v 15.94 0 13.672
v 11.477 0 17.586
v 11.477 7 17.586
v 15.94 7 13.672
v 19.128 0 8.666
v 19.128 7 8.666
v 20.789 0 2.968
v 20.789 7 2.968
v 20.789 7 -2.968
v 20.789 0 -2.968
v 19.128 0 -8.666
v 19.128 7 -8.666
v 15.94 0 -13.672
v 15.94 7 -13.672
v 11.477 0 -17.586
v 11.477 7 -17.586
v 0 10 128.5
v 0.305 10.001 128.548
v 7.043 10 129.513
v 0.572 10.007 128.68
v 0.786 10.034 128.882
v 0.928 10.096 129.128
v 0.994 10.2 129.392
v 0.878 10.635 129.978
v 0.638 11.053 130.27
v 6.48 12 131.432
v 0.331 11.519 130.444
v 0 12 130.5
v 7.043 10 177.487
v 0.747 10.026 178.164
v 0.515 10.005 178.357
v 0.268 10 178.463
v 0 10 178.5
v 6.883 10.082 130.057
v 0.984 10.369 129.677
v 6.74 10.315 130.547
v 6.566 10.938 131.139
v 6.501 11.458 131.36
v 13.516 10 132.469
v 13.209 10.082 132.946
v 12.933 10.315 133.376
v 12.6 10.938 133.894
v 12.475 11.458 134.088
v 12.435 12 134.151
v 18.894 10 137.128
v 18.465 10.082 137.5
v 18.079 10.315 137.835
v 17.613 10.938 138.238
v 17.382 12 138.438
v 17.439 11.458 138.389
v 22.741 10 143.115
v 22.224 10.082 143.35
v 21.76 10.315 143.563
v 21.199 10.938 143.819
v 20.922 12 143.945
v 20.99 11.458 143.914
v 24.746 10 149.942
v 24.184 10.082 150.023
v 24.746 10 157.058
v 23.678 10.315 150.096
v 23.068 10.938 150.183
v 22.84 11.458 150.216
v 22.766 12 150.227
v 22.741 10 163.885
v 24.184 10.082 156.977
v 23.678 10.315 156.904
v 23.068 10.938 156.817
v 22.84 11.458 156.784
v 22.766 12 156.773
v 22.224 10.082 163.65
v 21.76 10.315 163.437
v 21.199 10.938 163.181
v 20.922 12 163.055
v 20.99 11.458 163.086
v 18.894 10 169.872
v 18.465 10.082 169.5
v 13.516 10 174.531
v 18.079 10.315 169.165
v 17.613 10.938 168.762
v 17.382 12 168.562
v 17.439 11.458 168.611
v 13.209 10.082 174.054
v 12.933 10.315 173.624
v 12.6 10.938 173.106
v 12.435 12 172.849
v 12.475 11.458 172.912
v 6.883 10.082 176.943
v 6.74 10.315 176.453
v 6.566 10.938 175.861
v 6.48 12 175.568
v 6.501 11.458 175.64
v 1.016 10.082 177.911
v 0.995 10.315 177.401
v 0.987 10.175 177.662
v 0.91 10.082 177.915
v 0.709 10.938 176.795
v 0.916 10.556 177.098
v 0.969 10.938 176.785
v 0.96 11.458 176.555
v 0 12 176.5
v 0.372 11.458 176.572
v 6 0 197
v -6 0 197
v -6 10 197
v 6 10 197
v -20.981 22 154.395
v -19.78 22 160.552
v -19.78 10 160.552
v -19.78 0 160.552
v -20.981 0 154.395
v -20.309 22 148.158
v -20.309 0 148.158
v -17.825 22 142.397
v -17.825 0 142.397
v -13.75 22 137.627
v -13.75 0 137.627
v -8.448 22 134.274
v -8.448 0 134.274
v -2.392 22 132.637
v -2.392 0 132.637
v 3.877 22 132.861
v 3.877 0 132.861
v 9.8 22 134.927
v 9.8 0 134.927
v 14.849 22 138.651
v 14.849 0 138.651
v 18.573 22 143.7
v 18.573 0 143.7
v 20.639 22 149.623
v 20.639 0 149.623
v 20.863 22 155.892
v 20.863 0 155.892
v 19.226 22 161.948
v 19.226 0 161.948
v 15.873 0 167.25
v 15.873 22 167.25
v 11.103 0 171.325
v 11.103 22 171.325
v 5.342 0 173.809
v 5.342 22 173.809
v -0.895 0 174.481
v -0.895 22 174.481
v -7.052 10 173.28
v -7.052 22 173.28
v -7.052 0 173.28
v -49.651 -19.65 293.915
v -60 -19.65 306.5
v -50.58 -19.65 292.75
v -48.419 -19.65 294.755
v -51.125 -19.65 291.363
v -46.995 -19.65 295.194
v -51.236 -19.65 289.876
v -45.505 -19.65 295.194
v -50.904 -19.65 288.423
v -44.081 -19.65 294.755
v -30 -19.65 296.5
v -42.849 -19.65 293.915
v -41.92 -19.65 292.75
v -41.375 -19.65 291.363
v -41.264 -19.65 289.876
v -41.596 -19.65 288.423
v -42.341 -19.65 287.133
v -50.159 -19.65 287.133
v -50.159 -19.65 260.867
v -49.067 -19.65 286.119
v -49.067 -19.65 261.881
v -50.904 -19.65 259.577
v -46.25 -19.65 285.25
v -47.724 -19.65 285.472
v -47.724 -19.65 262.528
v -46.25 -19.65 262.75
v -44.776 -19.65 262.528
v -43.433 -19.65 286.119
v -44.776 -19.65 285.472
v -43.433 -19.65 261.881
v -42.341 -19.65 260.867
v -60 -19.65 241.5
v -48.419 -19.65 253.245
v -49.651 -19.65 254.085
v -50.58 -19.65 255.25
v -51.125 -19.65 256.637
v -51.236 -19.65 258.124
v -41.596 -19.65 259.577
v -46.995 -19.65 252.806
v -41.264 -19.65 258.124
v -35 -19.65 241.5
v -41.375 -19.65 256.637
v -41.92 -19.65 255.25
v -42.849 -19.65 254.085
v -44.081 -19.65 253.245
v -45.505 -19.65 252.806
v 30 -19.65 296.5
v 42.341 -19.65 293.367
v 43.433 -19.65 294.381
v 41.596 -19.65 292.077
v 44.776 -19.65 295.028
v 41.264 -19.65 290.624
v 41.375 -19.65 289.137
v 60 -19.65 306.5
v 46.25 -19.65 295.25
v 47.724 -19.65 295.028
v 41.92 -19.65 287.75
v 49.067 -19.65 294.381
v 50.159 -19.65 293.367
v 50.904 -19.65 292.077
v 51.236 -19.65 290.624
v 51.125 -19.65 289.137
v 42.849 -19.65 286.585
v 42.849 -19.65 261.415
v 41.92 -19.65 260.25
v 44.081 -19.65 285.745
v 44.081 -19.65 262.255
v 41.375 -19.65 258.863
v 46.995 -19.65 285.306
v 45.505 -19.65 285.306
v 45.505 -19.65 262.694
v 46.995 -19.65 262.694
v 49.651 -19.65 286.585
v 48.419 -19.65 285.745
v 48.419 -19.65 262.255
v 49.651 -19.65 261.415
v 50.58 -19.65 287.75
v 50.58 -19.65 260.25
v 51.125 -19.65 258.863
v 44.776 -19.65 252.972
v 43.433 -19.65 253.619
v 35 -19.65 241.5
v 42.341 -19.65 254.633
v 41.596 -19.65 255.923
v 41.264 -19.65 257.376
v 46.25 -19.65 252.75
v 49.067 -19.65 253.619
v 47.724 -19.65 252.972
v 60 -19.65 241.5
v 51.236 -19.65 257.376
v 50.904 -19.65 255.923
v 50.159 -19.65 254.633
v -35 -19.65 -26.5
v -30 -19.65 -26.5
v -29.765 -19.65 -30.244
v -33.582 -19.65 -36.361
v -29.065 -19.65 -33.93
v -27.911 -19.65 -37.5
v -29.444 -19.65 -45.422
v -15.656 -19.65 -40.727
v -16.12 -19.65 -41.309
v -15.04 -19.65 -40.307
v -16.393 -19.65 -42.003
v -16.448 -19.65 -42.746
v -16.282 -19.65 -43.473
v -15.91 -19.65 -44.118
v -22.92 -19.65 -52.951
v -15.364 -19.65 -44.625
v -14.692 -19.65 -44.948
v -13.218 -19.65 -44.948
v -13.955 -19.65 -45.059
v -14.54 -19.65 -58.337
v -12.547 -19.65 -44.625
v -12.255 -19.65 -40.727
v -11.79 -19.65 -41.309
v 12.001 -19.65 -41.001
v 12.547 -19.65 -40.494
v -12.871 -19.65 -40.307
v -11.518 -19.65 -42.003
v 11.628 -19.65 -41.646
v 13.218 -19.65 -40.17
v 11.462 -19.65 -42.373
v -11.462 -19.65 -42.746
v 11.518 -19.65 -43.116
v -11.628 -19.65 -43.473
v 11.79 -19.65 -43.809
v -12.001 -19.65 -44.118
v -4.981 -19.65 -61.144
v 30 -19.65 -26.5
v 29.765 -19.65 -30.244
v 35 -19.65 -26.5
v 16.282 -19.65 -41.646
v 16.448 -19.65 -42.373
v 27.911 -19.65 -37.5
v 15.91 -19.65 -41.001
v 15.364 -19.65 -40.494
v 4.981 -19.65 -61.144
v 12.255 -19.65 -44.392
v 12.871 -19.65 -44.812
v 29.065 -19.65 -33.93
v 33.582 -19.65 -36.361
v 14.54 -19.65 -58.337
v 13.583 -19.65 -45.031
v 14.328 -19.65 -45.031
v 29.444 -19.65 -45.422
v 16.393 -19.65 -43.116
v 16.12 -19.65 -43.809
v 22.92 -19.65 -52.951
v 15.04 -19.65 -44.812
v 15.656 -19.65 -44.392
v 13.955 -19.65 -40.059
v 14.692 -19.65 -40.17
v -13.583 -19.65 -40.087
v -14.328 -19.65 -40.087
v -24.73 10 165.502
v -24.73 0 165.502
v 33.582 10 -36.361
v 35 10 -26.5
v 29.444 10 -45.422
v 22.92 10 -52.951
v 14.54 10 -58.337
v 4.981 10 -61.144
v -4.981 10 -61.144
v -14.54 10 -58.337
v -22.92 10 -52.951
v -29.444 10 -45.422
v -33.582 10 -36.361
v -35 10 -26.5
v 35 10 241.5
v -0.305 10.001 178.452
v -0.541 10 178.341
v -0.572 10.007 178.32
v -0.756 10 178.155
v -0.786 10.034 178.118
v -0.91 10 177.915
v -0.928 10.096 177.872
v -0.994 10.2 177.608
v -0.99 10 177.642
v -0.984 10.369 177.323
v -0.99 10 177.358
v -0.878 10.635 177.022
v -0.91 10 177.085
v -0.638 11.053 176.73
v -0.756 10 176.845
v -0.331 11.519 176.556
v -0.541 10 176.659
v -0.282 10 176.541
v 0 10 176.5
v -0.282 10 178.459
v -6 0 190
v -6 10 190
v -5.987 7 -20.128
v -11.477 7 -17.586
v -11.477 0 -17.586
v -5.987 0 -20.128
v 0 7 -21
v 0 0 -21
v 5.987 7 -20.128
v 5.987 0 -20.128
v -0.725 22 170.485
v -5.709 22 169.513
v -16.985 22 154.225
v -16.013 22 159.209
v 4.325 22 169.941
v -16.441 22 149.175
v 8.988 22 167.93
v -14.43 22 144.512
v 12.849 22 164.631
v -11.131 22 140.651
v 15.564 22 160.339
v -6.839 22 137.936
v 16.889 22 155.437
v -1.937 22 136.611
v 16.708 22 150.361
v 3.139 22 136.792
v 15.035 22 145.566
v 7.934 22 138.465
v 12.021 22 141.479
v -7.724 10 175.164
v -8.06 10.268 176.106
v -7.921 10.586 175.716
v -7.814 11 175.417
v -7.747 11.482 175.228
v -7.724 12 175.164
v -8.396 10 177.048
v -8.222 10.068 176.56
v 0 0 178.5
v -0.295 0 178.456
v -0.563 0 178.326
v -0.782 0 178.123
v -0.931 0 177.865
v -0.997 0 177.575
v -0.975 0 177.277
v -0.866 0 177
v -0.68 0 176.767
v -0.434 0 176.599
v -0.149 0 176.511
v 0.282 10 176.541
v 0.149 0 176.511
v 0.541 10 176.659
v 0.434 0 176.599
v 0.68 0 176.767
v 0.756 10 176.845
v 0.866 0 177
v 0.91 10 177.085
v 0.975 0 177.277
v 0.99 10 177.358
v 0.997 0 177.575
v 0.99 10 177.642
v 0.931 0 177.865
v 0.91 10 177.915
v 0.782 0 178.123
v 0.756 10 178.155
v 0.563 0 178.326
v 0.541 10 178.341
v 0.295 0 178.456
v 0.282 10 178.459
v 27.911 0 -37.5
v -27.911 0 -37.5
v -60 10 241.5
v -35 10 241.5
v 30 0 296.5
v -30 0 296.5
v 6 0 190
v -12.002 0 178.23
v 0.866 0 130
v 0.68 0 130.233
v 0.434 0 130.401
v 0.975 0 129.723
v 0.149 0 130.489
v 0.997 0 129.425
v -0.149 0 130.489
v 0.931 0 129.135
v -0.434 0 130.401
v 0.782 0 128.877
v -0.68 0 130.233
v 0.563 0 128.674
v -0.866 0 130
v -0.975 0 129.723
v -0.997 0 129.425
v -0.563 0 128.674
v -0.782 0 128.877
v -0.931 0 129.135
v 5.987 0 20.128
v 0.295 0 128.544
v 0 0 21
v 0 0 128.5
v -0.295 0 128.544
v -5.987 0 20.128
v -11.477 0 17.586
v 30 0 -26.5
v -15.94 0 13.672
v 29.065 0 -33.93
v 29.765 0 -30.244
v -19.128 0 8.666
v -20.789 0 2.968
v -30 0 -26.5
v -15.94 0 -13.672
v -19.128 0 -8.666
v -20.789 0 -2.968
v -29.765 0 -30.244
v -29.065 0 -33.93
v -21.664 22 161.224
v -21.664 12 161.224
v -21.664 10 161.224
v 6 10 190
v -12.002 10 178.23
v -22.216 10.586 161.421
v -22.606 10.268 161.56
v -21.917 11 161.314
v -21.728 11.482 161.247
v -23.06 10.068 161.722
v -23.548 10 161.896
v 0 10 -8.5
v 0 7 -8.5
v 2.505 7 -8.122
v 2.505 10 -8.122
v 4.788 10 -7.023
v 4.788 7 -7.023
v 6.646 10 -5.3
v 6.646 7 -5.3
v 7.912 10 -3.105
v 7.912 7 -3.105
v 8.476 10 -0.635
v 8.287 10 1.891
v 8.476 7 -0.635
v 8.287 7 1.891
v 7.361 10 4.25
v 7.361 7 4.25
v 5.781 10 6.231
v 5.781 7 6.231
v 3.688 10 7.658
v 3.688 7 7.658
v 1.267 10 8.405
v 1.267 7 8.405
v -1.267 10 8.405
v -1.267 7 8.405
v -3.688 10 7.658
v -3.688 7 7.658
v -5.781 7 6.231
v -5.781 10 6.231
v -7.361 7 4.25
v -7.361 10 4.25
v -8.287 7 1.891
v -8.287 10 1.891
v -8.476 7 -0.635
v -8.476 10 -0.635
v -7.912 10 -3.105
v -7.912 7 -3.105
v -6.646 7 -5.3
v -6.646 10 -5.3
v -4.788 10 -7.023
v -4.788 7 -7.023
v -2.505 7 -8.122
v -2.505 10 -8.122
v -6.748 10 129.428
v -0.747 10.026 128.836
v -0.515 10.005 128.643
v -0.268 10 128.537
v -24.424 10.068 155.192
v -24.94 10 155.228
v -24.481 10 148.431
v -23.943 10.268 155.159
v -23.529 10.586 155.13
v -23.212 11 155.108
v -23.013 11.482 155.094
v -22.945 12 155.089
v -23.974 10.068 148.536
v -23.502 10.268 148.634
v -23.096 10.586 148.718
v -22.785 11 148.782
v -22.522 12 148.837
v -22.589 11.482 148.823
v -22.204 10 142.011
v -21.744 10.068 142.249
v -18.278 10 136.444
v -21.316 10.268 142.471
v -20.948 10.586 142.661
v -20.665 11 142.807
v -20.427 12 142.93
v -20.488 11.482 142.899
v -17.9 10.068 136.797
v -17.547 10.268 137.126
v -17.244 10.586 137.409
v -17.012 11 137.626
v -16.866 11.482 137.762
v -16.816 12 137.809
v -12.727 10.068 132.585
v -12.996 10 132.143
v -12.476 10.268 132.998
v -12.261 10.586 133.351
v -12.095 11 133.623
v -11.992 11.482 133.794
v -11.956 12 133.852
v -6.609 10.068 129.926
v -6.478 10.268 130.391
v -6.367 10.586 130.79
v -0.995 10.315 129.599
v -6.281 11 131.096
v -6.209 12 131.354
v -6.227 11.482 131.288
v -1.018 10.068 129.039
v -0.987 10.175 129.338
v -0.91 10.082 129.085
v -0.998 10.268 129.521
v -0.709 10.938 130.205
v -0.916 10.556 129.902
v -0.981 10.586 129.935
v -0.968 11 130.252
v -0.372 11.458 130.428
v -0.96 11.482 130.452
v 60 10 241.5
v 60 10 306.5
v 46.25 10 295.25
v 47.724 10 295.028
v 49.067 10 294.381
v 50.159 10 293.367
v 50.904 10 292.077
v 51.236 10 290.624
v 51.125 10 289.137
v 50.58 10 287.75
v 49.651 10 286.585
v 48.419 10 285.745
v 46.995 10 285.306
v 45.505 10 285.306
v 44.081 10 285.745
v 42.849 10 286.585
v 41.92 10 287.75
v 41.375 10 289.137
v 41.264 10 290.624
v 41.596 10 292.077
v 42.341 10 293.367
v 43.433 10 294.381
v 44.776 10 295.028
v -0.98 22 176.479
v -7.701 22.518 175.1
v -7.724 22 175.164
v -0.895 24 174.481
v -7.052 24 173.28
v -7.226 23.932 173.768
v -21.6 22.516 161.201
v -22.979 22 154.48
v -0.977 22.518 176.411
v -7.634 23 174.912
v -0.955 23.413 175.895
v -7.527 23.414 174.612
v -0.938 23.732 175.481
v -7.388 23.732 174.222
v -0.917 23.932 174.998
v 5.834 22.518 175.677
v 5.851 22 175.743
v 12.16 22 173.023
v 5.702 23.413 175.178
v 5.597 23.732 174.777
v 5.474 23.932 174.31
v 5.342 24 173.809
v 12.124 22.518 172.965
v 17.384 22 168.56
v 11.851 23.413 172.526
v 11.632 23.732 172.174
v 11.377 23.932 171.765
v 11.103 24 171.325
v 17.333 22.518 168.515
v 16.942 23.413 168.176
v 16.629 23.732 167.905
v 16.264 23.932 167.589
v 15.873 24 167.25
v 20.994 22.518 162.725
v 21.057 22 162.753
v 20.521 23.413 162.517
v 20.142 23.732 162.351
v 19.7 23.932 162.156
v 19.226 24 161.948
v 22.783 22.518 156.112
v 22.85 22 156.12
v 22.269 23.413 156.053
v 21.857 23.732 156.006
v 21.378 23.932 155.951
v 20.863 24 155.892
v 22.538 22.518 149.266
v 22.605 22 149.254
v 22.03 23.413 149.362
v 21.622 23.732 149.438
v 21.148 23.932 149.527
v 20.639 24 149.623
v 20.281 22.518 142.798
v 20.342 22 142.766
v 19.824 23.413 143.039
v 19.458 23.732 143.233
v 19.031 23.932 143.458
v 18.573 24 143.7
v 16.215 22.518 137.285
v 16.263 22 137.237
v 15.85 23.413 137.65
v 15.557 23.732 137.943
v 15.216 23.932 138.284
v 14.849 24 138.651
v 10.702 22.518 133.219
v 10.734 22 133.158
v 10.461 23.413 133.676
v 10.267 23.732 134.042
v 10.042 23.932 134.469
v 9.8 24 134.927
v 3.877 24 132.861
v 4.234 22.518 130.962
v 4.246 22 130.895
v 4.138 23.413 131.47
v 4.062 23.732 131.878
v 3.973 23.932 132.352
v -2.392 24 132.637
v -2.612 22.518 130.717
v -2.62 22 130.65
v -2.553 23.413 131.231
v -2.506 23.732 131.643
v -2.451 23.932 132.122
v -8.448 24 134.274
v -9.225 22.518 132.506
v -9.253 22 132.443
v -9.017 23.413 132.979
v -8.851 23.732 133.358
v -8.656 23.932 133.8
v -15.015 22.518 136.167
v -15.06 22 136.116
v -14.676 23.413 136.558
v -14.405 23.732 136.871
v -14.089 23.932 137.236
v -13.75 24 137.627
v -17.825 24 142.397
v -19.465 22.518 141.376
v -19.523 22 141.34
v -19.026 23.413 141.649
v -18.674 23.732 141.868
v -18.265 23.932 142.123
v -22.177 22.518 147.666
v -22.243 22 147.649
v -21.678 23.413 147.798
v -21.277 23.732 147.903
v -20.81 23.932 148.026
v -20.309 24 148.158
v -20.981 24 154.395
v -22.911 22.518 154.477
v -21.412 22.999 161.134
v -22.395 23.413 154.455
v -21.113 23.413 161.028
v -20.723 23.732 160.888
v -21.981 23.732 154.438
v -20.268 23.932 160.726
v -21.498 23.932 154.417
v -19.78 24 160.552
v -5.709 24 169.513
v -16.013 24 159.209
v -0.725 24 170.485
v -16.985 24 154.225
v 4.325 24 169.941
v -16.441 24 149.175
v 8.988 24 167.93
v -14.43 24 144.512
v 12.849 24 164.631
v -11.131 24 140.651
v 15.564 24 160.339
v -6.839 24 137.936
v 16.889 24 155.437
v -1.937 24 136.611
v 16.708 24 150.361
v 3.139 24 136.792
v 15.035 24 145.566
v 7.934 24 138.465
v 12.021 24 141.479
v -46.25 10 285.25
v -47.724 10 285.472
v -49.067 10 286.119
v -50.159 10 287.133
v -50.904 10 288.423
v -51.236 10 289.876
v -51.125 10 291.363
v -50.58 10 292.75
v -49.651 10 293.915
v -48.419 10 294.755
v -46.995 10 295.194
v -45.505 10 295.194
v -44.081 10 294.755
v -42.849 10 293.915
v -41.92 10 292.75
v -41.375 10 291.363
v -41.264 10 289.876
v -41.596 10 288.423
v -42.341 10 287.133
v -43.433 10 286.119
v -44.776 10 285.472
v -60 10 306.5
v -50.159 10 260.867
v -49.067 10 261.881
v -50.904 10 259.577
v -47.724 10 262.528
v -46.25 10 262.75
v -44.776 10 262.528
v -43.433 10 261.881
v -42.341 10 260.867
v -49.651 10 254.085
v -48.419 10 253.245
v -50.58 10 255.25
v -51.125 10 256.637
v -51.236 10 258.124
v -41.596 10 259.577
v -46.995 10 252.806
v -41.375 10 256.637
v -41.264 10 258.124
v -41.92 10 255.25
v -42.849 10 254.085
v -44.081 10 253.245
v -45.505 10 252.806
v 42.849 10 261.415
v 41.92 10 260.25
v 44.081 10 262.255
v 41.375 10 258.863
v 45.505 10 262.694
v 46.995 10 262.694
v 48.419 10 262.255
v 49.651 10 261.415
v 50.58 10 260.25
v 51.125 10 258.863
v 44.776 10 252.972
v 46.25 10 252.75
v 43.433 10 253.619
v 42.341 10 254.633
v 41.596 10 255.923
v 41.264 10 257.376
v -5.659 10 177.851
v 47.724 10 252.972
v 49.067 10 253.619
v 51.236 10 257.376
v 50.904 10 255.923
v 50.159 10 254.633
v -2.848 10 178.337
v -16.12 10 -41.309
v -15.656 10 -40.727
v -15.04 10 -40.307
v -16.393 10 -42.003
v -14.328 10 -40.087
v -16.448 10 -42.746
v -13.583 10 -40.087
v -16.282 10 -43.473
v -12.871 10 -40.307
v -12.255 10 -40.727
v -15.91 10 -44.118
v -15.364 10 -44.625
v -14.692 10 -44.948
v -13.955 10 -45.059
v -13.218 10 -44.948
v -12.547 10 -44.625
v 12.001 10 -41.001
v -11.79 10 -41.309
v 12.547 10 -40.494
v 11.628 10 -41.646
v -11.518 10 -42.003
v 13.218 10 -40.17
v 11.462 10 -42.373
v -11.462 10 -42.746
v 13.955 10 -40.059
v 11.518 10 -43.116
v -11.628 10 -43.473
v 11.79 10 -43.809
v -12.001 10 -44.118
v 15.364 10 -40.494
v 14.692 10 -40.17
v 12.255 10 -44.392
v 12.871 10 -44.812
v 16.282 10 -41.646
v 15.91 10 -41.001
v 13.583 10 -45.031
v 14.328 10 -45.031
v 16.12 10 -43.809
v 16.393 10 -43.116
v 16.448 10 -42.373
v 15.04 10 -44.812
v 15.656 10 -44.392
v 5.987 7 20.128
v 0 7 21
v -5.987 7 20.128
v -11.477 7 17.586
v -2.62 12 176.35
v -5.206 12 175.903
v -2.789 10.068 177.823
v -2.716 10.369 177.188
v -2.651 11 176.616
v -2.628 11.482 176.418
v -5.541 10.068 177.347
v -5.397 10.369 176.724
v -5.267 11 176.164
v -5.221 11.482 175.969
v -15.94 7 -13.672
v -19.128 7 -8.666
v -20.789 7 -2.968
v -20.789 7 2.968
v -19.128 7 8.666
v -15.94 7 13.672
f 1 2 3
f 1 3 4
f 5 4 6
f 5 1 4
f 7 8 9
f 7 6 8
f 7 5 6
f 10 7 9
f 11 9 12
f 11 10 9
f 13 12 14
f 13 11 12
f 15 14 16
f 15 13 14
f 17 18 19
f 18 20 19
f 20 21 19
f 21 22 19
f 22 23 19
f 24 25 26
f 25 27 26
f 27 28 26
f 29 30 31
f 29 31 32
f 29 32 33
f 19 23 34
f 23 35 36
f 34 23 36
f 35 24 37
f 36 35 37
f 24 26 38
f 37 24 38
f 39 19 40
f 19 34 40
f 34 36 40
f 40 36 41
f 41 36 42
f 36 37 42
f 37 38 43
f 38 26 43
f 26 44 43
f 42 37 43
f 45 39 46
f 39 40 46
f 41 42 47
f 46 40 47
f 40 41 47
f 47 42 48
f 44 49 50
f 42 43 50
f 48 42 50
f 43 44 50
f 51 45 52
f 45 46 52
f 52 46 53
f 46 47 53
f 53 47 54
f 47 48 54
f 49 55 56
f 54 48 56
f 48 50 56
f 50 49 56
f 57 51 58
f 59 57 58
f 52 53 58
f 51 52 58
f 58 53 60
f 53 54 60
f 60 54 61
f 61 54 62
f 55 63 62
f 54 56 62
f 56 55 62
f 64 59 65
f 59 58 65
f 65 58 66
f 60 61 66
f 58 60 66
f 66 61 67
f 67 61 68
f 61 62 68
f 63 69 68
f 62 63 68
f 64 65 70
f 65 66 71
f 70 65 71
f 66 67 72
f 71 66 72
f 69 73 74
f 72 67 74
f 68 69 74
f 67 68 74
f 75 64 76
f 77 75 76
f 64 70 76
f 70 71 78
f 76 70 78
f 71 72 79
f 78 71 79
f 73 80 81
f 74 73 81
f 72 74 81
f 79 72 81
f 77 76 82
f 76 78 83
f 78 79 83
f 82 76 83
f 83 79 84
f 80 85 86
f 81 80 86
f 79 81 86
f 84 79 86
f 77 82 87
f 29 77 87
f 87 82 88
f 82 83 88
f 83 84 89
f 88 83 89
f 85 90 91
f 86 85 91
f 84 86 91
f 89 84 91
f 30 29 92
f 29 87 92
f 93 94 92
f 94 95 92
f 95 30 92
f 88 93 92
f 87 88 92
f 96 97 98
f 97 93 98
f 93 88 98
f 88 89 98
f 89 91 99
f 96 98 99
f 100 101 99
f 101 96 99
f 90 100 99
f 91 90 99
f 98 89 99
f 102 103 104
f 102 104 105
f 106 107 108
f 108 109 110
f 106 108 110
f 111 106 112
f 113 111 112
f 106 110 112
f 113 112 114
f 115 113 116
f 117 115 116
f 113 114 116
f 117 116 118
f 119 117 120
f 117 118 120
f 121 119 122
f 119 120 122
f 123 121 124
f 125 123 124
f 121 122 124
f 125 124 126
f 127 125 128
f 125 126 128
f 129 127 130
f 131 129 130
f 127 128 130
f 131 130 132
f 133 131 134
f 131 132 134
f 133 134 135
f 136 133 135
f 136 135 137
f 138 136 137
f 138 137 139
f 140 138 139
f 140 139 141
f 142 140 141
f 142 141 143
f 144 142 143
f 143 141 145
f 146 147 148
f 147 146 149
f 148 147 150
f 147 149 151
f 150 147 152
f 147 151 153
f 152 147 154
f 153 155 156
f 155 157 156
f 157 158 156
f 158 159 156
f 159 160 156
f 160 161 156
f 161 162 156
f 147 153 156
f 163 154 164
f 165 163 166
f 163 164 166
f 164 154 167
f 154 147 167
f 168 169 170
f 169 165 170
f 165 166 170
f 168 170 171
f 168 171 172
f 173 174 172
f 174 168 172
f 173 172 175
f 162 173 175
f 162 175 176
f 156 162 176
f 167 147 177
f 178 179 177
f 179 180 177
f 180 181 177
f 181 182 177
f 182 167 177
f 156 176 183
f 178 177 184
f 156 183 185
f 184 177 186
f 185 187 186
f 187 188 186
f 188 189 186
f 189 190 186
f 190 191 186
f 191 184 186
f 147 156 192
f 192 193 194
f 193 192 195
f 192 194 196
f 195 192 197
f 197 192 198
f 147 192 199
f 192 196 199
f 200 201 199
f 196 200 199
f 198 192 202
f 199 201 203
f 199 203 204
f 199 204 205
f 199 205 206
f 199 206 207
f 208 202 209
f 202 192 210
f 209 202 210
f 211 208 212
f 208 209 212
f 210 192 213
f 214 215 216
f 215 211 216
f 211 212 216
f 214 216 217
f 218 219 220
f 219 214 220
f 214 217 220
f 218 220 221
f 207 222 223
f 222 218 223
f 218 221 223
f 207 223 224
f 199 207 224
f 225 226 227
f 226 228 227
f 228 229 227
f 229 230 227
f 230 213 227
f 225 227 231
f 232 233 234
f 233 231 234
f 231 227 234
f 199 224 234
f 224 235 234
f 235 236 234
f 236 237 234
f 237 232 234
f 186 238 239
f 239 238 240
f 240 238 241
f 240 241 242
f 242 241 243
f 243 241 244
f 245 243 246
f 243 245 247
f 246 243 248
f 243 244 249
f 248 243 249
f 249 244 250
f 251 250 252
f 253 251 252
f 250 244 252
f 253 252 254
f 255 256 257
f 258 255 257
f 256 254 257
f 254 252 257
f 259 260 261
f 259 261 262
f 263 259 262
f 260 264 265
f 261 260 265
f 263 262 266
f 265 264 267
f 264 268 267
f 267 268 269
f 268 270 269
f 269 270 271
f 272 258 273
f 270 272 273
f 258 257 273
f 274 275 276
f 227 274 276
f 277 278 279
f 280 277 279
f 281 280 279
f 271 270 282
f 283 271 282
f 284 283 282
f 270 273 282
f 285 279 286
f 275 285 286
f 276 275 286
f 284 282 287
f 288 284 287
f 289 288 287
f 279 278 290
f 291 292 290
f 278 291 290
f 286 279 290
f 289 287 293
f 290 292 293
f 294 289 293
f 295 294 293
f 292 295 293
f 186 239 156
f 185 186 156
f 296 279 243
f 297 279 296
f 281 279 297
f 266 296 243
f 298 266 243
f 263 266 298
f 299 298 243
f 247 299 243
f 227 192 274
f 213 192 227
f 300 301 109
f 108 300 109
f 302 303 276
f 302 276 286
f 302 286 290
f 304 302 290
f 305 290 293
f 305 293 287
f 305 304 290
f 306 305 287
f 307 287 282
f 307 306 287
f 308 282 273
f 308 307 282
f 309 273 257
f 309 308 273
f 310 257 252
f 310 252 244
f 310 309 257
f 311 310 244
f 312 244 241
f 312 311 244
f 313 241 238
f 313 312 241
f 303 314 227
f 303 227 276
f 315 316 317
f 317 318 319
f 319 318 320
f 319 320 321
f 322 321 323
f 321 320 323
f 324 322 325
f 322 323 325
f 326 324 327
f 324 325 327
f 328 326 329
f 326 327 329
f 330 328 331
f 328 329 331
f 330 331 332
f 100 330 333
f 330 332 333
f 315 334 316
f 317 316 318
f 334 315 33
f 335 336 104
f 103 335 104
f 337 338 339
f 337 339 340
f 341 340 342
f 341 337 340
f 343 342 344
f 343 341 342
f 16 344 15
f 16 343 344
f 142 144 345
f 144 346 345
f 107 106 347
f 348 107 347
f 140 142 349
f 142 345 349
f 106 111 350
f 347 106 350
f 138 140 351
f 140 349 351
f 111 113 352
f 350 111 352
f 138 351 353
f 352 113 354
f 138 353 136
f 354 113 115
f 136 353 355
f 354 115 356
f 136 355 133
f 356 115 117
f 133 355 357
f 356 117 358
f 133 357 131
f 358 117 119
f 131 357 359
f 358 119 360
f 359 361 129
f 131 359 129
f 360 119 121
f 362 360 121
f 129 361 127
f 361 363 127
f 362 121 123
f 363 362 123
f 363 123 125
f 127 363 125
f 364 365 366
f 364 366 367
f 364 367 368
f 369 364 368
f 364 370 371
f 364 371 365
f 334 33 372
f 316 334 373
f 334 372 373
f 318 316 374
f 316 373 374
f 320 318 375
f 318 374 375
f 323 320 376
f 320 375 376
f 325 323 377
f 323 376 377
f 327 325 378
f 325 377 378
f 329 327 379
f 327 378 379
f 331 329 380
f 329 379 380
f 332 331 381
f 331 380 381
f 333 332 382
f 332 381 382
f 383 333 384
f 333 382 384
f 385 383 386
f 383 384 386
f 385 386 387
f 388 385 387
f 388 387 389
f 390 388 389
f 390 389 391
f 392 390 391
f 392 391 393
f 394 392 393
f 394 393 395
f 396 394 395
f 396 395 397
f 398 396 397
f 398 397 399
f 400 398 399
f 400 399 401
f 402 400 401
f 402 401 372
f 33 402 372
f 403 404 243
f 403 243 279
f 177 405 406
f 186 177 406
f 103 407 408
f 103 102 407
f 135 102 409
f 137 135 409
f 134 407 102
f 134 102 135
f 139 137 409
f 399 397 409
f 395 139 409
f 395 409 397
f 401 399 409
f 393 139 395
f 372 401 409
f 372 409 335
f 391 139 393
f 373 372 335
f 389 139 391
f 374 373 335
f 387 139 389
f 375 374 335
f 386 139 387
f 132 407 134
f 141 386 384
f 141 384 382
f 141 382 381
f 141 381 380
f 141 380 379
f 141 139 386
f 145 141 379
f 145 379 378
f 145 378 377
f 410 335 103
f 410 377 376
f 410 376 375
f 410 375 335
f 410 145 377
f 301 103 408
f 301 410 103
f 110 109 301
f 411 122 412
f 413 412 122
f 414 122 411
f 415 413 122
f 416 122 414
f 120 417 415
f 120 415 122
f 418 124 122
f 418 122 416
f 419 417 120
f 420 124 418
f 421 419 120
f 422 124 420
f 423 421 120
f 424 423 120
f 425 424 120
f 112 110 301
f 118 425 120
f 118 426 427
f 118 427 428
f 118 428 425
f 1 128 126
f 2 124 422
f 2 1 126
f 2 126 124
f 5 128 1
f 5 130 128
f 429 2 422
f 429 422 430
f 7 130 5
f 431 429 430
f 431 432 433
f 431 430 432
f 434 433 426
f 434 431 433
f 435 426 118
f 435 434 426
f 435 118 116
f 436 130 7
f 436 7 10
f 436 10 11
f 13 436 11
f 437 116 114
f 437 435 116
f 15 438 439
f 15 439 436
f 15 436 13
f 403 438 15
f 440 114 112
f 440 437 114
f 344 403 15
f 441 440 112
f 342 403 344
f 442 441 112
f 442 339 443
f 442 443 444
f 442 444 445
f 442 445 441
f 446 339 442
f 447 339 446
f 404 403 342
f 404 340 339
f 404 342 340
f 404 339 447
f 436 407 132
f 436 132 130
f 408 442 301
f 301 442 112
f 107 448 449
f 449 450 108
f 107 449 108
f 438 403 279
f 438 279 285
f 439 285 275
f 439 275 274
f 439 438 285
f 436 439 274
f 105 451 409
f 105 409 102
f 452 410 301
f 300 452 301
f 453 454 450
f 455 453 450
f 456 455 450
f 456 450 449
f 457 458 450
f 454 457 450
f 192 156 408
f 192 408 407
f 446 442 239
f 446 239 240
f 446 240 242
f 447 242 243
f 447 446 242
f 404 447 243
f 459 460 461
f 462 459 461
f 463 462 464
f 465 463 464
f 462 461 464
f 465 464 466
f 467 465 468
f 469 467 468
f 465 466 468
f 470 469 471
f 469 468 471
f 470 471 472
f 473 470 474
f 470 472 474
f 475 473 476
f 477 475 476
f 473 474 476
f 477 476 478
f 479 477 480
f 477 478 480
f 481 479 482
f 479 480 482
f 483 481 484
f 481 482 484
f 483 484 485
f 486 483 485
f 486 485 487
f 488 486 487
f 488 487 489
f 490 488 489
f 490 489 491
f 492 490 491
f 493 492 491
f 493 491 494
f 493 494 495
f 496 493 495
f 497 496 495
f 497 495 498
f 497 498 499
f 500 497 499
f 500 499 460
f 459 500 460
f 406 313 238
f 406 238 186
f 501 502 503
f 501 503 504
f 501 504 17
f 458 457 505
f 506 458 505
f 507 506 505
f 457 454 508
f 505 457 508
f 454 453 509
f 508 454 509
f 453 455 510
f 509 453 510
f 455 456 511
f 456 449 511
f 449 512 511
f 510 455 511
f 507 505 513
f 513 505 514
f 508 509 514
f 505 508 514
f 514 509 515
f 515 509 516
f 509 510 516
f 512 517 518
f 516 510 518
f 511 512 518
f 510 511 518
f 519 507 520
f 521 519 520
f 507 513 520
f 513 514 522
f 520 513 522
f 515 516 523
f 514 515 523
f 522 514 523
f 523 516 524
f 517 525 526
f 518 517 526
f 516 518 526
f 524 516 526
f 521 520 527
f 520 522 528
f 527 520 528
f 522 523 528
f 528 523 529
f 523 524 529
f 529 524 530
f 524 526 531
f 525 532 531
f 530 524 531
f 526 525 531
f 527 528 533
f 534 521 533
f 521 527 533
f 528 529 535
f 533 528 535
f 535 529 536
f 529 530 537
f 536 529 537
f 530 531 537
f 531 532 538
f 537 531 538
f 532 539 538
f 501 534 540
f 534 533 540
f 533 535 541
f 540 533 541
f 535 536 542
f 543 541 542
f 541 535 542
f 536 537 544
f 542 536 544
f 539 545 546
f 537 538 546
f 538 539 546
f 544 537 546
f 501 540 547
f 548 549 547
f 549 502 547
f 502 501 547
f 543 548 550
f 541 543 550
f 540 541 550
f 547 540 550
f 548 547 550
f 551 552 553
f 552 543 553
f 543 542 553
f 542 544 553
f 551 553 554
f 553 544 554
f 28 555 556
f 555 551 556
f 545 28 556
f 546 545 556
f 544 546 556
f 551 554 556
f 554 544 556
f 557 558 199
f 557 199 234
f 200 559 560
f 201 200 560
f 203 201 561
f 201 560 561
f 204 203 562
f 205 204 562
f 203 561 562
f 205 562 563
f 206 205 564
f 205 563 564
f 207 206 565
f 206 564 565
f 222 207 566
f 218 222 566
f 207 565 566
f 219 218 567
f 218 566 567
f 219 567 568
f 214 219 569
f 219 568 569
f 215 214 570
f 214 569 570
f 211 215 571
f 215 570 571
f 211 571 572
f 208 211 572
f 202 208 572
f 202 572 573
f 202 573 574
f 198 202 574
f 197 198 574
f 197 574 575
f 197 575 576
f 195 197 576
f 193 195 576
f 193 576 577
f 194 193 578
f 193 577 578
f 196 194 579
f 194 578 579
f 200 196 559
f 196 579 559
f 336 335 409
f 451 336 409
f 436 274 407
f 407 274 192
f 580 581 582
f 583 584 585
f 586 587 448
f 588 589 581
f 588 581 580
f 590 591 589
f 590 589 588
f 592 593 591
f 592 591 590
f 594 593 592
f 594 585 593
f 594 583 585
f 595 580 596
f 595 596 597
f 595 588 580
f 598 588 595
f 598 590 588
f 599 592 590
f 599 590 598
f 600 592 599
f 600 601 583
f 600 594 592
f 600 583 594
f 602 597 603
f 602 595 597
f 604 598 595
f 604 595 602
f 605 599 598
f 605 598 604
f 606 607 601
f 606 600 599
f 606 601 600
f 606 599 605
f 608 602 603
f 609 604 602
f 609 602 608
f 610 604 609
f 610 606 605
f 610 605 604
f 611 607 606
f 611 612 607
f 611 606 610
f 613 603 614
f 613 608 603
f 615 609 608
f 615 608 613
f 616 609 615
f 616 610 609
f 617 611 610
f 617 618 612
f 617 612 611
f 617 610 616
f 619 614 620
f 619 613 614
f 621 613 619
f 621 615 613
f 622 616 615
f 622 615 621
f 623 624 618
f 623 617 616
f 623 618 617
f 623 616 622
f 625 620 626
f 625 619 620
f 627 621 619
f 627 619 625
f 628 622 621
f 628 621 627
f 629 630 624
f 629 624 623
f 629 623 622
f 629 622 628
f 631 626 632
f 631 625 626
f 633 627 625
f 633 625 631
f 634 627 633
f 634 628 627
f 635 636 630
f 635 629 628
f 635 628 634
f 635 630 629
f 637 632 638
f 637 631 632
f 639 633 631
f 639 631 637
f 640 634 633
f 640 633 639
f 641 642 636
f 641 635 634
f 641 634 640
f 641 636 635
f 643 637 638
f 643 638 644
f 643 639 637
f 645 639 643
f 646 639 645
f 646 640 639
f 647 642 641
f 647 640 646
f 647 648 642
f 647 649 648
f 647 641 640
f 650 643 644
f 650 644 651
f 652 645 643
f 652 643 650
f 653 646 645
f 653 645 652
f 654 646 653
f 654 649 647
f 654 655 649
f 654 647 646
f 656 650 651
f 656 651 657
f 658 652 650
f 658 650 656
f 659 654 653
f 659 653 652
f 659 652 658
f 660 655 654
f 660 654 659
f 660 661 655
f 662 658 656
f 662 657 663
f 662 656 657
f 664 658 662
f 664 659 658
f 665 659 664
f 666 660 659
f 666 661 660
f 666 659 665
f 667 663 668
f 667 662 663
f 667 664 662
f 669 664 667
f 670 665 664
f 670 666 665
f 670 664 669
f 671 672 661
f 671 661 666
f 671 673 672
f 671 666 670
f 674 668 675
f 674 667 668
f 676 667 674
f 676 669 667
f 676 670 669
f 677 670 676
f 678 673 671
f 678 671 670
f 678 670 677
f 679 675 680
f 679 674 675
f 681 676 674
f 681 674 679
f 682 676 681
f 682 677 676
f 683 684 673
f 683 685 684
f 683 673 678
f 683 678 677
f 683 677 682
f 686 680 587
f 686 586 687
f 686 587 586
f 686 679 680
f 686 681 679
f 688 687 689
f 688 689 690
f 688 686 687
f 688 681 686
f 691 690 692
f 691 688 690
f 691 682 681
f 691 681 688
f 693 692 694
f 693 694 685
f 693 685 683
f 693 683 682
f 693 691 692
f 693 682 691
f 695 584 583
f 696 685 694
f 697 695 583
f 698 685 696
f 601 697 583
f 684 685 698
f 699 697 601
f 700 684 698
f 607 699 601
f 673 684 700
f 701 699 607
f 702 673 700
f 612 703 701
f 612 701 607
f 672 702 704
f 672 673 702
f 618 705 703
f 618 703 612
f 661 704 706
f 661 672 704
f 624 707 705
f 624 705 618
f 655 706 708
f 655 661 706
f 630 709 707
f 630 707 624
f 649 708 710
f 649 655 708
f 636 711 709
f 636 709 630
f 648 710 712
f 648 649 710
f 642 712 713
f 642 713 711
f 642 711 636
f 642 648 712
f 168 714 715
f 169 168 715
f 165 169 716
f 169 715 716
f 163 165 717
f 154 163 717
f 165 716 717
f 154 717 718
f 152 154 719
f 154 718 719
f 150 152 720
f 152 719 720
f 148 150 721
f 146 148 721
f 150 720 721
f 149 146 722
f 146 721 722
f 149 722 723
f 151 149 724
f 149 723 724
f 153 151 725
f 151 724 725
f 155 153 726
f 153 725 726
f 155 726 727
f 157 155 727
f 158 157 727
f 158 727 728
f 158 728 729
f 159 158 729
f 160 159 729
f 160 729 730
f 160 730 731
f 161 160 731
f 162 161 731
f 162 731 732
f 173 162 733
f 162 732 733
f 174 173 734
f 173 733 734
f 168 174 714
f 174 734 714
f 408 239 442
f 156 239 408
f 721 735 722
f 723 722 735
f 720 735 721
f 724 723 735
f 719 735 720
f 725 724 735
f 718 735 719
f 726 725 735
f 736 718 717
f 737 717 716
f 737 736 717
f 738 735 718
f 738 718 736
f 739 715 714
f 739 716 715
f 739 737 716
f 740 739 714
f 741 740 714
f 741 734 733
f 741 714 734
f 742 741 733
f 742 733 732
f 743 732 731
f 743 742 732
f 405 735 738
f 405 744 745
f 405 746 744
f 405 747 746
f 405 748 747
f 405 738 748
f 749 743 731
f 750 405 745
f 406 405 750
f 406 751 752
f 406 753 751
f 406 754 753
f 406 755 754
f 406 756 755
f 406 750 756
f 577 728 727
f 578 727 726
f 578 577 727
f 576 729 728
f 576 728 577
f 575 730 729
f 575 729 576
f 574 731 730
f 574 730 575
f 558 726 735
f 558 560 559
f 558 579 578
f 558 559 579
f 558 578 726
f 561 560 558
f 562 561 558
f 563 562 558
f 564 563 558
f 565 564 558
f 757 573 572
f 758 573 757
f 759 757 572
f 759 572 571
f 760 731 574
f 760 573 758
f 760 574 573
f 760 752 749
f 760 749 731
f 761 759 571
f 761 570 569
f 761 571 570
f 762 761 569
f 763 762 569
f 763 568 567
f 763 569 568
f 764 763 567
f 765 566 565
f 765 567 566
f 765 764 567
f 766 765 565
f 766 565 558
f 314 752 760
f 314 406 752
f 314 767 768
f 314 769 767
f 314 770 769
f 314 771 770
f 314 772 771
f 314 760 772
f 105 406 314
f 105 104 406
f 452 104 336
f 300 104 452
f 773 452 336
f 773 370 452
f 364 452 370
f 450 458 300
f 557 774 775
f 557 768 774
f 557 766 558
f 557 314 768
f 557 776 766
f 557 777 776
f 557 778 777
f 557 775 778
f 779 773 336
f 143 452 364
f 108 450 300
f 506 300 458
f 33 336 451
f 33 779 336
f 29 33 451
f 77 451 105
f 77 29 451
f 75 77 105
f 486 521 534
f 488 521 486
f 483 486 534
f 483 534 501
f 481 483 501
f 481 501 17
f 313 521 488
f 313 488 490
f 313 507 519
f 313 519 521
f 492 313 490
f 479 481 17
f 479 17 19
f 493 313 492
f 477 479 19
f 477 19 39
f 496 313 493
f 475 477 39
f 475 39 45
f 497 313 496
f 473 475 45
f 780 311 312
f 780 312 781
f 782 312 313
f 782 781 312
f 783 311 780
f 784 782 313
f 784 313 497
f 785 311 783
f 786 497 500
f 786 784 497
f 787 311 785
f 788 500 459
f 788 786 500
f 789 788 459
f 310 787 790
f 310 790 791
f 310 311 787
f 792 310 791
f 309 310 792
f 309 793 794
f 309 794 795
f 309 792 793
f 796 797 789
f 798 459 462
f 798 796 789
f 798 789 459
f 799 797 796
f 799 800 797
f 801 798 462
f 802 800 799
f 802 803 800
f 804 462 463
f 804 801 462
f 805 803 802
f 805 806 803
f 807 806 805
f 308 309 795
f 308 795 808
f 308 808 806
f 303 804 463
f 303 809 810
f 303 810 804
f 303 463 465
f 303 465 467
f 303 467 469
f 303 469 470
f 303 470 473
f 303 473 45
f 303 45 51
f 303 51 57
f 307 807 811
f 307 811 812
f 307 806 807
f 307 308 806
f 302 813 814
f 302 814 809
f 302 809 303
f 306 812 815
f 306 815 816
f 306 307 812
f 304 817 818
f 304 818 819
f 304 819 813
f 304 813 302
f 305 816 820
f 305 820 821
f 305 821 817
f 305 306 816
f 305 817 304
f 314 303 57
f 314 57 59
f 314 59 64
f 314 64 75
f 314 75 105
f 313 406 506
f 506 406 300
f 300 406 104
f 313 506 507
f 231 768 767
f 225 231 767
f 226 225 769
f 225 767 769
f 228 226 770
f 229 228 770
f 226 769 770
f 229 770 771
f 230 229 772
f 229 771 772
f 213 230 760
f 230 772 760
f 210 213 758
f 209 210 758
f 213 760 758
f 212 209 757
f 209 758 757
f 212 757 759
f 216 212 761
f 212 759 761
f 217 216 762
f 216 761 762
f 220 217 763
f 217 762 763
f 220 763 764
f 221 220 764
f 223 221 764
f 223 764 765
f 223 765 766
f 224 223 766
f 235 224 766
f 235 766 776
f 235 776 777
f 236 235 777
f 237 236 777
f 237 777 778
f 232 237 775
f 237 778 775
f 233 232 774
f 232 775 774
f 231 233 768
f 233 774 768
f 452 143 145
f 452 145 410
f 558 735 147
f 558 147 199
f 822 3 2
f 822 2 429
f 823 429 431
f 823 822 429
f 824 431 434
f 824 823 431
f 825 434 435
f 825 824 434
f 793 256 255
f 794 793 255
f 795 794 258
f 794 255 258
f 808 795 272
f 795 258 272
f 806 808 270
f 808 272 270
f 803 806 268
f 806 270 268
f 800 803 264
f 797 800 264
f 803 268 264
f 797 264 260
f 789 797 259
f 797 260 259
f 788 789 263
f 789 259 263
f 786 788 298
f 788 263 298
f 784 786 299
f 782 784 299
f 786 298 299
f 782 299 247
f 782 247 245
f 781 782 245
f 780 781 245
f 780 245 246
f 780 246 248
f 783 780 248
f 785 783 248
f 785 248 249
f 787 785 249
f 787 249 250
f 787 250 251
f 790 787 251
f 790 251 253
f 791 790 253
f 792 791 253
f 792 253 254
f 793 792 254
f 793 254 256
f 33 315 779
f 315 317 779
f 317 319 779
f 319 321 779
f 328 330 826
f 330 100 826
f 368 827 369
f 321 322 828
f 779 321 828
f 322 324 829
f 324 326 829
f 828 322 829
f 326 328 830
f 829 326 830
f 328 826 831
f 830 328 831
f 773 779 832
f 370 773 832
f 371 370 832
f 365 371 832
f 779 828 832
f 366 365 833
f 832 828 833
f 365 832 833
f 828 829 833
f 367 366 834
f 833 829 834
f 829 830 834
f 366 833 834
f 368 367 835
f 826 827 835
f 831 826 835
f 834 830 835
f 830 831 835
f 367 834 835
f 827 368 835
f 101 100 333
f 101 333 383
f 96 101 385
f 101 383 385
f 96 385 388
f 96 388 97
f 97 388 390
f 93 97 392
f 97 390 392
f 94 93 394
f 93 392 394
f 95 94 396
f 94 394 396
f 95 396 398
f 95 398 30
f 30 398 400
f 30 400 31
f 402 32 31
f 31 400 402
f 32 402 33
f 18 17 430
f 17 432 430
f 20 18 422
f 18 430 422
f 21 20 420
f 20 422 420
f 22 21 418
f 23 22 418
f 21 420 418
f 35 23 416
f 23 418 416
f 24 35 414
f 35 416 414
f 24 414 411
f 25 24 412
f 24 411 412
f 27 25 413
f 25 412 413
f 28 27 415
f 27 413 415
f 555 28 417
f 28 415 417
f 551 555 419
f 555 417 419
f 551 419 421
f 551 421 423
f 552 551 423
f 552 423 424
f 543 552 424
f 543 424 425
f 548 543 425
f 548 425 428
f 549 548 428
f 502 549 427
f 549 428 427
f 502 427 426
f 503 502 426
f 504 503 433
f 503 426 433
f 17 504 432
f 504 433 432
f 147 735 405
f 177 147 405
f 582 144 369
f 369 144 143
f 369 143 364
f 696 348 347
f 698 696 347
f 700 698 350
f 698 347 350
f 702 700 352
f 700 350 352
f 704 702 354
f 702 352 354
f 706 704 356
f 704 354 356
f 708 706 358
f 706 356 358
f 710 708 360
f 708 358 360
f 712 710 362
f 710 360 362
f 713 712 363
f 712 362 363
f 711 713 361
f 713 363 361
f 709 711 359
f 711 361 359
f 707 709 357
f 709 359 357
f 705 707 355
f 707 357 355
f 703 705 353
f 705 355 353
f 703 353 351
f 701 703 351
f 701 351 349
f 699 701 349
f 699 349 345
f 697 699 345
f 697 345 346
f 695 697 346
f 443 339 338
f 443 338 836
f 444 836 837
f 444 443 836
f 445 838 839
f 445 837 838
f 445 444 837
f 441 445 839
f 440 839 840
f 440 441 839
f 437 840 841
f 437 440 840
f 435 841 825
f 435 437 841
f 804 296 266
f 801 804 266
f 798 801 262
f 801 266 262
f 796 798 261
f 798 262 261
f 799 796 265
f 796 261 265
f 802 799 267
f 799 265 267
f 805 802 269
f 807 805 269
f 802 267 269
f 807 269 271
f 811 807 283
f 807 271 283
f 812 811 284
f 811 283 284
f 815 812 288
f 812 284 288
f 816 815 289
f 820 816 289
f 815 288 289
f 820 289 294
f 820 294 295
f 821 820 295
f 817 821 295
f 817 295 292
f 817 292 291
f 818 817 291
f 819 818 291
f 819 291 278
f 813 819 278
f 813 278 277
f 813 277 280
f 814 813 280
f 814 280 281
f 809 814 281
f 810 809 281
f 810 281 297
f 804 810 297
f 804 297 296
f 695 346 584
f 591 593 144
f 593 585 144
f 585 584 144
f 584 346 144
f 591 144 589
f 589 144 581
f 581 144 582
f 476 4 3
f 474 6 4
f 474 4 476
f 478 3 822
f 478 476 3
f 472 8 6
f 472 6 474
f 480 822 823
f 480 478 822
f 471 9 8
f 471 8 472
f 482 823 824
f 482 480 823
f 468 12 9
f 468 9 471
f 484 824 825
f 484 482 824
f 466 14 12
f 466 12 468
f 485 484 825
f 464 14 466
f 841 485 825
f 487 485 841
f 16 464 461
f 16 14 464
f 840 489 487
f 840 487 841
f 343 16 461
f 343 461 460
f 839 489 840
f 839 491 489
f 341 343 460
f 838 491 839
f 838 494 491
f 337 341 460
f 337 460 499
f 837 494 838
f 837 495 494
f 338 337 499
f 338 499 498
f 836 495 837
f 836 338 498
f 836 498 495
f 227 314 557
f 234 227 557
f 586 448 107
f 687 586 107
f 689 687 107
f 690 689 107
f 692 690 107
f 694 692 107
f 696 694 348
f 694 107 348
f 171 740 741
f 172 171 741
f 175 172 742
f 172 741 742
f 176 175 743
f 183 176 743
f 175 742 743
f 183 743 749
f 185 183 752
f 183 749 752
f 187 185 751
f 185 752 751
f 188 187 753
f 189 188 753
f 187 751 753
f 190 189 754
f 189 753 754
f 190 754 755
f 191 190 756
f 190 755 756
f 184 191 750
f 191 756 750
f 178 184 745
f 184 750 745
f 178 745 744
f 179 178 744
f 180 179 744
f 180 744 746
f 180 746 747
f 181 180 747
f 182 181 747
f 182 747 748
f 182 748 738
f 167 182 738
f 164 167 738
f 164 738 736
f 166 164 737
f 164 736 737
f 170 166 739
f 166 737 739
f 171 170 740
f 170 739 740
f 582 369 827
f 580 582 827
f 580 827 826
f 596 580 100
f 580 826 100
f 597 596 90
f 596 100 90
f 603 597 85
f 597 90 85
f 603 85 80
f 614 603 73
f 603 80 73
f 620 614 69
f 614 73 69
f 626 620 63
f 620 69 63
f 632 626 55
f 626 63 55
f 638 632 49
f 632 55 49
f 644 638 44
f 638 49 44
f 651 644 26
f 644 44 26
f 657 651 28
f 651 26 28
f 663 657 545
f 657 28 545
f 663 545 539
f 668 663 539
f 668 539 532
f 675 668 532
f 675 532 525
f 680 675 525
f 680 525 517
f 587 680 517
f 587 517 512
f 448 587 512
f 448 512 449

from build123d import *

# Parameters (mm, degrees)
BOSS_EXTRUDE1_DEPTH = 10
BOSS_EXTRUDE2_START = -3
SKETCH2_R           = 3.5
SKETCH2_R_2         = 7.5
BOSS_EXTRUDE2_DEPTH = 3
BOSS_EXTRUDE5_START = -3
BOSS_EXTRUDE5_DEPTH = 10
SKETCH6_R           = 8.5
CUT_EXTRUDE1_DEPTH  = 246.440929757
SKETCH7_R           = 1
CUT_EXTRUDE2_DEPTH  = 246.544802429
BOSS_EXTRUDE6_DEPTH = 22
BOSS_EXTRUDE7_DEPTH = 2
FILLET1_R           = 2
FILLET3_R           = 2
SKETCH11_W          = 12
SKETCH11_H          = 7
CUT_EXTRUDE3_DEPTH  = 247.512170095
BOSS_EXTRUDE8_START = -10
BOSS_EXTRUDE8_DEPTH = 29.65
SKETCH13_R          = 2.5
CUT_EXTRUDE4_DEPTH  = 250.845097028
SKETCH14_W          = 120
SKETCH14_H          = 65
SKETCH14_R          = 5
BOSS_EXTRUDE9_DEPTH = 29.65
SKETCH15_W          = 60
SKETCH15_H          = 55
CUT_EXTRUDE5_DEPTH  = 19.65


with BuildPart() as part:
    # Sketch1 → Boss-Extrude1 (new body)
    with BuildSketch(Plane(origin=(0, 0, 0), x_dir=(1, 0, 0), z_dir=(0, 1, 0))):
        with BuildLine():
            Line((30, 26.5), (30, -243.5))
            Line((30, -243.5), (-30, -243.5))
            Line((-30, -243.5), (-30, 26.5))
            ThreePointArc((-30, 26.5), (0, 56.5), (30, 26.5))
        make_face()
        with BuildLine():
            ThreePointArc((11.477382224, -17.586065429), (21, 0), (11.477382224, 17.586065429))
            Line((11.477382224, 17.586065429), (5.68518373, 33.5))
            Line((5.68518373, 33.5), (-5.68518373, 33.5))
            Line((-5.68518373, 33.5), (-11.477382224, 17.586065429))
            ThreePointArc((-11.477382224, 17.586065429), (-21, 0), (-11.477382224, -17.586065429))
            Line((-11.477382224, -17.586065429), (-5.68518373, -33.5))
            Line((-5.68518373, -33.5), (5.68518373, -33.5))
            Line((5.68518373, -33.5), (11.477382224, -17.586065429))
        make_face(mode=Mode.SUBTRACT)
    extrude(amount=BOSS_EXTRUDE1_DEPTH)

    # Sketch2 → Boss-Extrude2 (add)
    with BuildSketch(Plane(origin=(0, 10, 0), x_dir=(1, 0, 0), z_dir=(0, 1, 0)).offset(BOSS_EXTRUDE2_START)):
        with BuildLine():
            Line((5.68518373, 33.5), (11.477382224, 17.586065429))
            ThreePointArc((11.477382224, 17.586065429), (21, 0), (11.477382224, -17.586065429))
            Line((11.477382224, -17.586065429), (5.68518373, -33.5))
            Line((5.68518373, -33.5), (-5.68518373, -33.5))
            Line((-5.68518373, -33.5), (-11.477382224, -17.586065429))
            ThreePointArc((-11.477382224, -17.586065429), (-21, 0), (-11.477382224, 17.586065429))
            Line((-11.477382224, 17.586065429), (-5.68518373, 33.5))
            Line((-5.68518373, 33.5), (5.68518373, 33.5))
        make_face()
        with Locations(Location((0, 26.5, 0), (0, 0, 270))):
            Circle(SKETCH2_R, mode=Mode.SUBTRACT)
        with Locations(Location((0, -26.5, 0), (0, 0, 90))):
            Circle(SKETCH2_R, mode=Mode.SUBTRACT)
        with Locations(Location((0, 0, 0), (0, 0, 270))):
            Circle(SKETCH2_R_2, mode=Mode.SUBTRACT)
    extrude(amount=BOSS_EXTRUDE2_DEPTH)

    # Sketch5 → Boss-Extrude5 (add)
    with BuildSketch(Plane.XZ.offset(-7).offset(BOSS_EXTRUDE5_START)):
        with BuildLine():
            Line((11.477382224, -17.586065429), (5.68518373, -33.5))
            Line((5.68518373, -33.5), (-5.68518373, -33.5))
            Line((-5.68518373, -33.5), (-11.477382224, -17.586065429))
            ThreePointArc((-11.477382224, -17.586065429), (0, -21), (11.477382224, -17.586065429))
        make_face()
        with BuildLine():
            Line((5.68518373, 33.5), (11.477382224, 17.586065429))
            ThreePointArc((11.477382224, 17.586065429), (0, 21), (-11.477382224, 17.586065429))
            Line((-11.477382224, 17.586065429), (-5.68518373, 33.5))
            Line((-5.68518373, 33.5), (5.68518373, 33.5))
        make_face()
    extrude(amount=BOSS_EXTRUDE5_DEPTH)

    # Sketch6 → Cut-Extrude1 (cut, through all)
    with BuildSketch(Plane.XZ.offset(-7)):
        with Locations(Location((0, 0, 0), (0, 0, 270))):
            Circle(SKETCH6_R)
    extrude(amount=-CUT_EXTRUDE1_DEPTH, mode=Mode.SUBTRACT)

    # Sketch7 → Cut-Extrude2 (cut, through all)
    with BuildSketch(Plane.XZ):
        with Locations(Location((0, 129.5, 0), (0, 0, 270))):
            Circle(SKETCH7_R)
        with Locations(Location((0, 177.5, 0), (0, 0, 90))):
            Circle(SKETCH7_R)
        with BuildLine():
            Line((-12.002194303, 178.230116364), (-24.730116364, 165.502194303))
            Line((-24.730116364, 165.502194303), (-19.780368896, 160.552446834))
            ThreePointArc((-19.780368896, 160.552446834), (14.849242405, 138.650757595), (-7.052446834, 173.280368896))
            Line((-7.052446834, 173.280368896), (-12.002194303, 178.230116364))
        make_face()
    extrude(amount=-CUT_EXTRUDE2_DEPTH, mode=Mode.SUBTRACT)

    # Sketch9 → Boss-Extrude6 (add)
    with BuildSketch(Plane.XZ):
        with BuildLine():
            Line((-21.664213552, 161.224108438), (-19.780368896, 160.552446834))
            ThreePointArc((-19.780368896, 160.552446834), (14.849242405, 138.650757595), (-7.052446834, 173.280368896))
            Line((-7.052446834, 173.280368896), (-7.724108438, 175.164213552))
            ThreePointArc((-7.724108438, 175.164213552), (16.263455967, 137.236544033), (-21.664213552, 161.224108438))
        make_face()
    extrude(amount=-BOSS_EXTRUDE6_DEPTH)

    # Sketch10 → Boss-Extrude7 (add)
    with BuildSketch(Plane(origin=(0, 22, 0), x_dir=(1, 0, 0), z_dir=(0, 1, 0))):
        with BuildLine():
            Line((-21.664213552, -161.224108438), (-16.012679582, -159.209123628))
            ThreePointArc((-16.012679582, -159.209123628), (12.02081528, -141.47918472), (-5.709123628, -169.512679582))
            Line((-5.709123628, -169.512679582), (-7.724108438, -175.164213552))
            ThreePointArc((-7.724108438, -175.164213552), (16.263455967, -137.236544033), (-21.664213552, -161.224108438))
        make_face()
    extrude(amount=BOSS_EXTRUDE7_DEPTH)

    # Fillet1
    fillet1_edges = [part.edges().sort_by_distance(p)[0] for p in [
        (16.263455967, 24, 137.236544033),
    ]]
    fillet(fillet1_edges, radius=FILLET1_R)

    # Fillet3
    # the kernel refuses this fillet: 2 mm, written as the material it adds along each edge
    with BuildSketch(Plane(origin=(0, 10, 153.5), x_dir=(-2.3359514129780358e-09, 0, 1.0), z_dir=(1.0, 0, 2.3359514129780358e-09))) as fillet3_piece_1_section:
        with BuildLine():
            CenterArc((23 + FILLET3_R, -FILLET3_R), FILLET3_R, 90, 90)
            Line((23 + FILLET3_R, 0), (23, 0))
            Line((23, 0), (23, -FILLET3_R))
        make_face()
    fillet3_piece_1 = revolve(axis=Axis((0, 10, 153.5), (0, -1, 0)), revolution_arc=19.623066341, mode=Mode.PRIVATE)
    fillet3_piece_1 = fillet3_piece_1 - Plane(origin=(0, 10.450783466, 177.5), x_dir=(0, 0, 1), z_dir=(0, -1, 0)) * Cylinder(1, 101, mode=Mode.PRIVATE)
    add(fillet3_piece_1)
    with BuildSketch(Plane(origin=(0, 10, 153.5), x_dir=(-0.9419223283656014, 0, 0.3358308016342816), z_dir=(0.3358308016342816, 0, 0.9419223283656014))) as fillet3_piece_2_section:
        with BuildLine():
            CenterArc((23 + FILLET3_R, -FILLET3_R), FILLET3_R, 90, 90)
            Line((23 + FILLET3_R, 0), (23, 0))
            Line((23, 0), (23, -FILLET3_R))
        make_face()
    fillet3_piece_2 = revolve(axis=Axis((0, 10, 153.5), (0, -1, 0)), revolution_arc=109.623066475, mode=Mode.PRIVATE)
    fillet3_piece_2 = fillet3_piece_2 - Plane(origin=(0, 10.562032205, 129.5), x_dir=(0, 0, -1), z_dir=(0, -1, 0)) * Cylinder(1, 101, mode=Mode.PRIVATE)
    add(fillet3_piece_2)
    with BuildSketch(Plane(origin=(0, 10, 153.5), x_dir=(0, 0, -1), z_dir=(-1, 0, 0))) as fillet3_piece_3_section:
        with BuildLine():
            CenterArc((23 + FILLET3_R, -FILLET3_R), FILLET3_R, 90, 90)
            Line((23 + FILLET3_R, 0), (23, 0))
            Line((23, 0), (23, -FILLET3_R))
        make_face()
    fillet3_piece_3 = revolve(axis=Axis((0, 10, 153.5), (0, -1, 0)), revolution_arc=180.000000134, mode=Mode.PRIVATE)
    fillet3_piece_3 = fillet3_piece_3 - Plane(origin=(0, 10.557784065, 177.5), x_dir=(0, 0, 1), z_dir=(0, -1, 0)) * Cylinder(1, 101, mode=Mode.PRIVATE)
    fillet3_piece_3 = fillet3_piece_3 - Plane(origin=(0, 10.557784065, 129.5), x_dir=(0, 0, -1), z_dir=(0, -1, 0)) * Cylinder(1, 101, mode=Mode.PRIVATE)
    add(fillet3_piece_3)

    # Sketch11 → Cut-Extrude3 (cut, through all)
    with BuildSketch(Plane.XZ):
        with Locations((0, 193.5)):
            Rectangle(SKETCH11_W, SKETCH11_H)
    extrude(amount=-CUT_EXTRUDE3_DEPTH, mode=Mode.SUBTRACT)

    # Sketch12 → Boss-Extrude8 (add)
    with BuildSketch(Plane.XZ.offset(BOSS_EXTRUDE8_START)):
        with BuildLine():
            Line((35, 243.5), (35, -26.5))
            ThreePointArc((35, -26.5), (0, -61.5), (-35, -26.5))
            Line((-35, -26.5), (-35, 243.5))
            Line((-35, 243.5), (-30, 243.5))
            Line((-30, 243.5), (-30, -26.5))
            ThreePointArc((-30, -26.5), (-29.473014303, -32.09834153), (-27.910571474, -37.5))
            Line((-27.910571474, -37.5), (27.910571474, -37.5))
            ThreePointArc((27.910571474, -37.5), (29.473014303, -32.09834153), (30, -26.5))
            Line((30, -26.5), (30, 243.5))
            Line((30, 243.5), (35, 243.5))
        make_face()
    extrude(amount=BOSS_EXTRUDE8_DEPTH)

    # Sketch13 → Cut-Extrude4 (cut, through all)
    with BuildSketch(Plane.XZ.offset(19.65)):
        with Locations(Location((-13.955285737, -42.559356041, 0), (0, 0, 270))):
            Circle(SKETCH13_R)
        with Locations(Location((13.955285737, -42.559356041, 0), (0, 0, 90))):
            Circle(SKETCH13_R)
    extrude(amount=-CUT_EXTRUDE4_DEPTH, mode=Mode.SUBTRACT)

    # Sketch14 → Boss-Extrude9 (add)
    with BuildSketch(Plane(origin=(0, 10, 0), x_dir=(1, 0, 0), z_dir=(0, 1, 0))):
        with Locations((0, -274)):
            Rectangle(SKETCH14_W, SKETCH14_H)
        with Locations(Location((46.25, -290.25, 0), (0, 0, 270))):
            Circle(SKETCH14_R, mode=Mode.SUBTRACT)
        with Locations(Location((-46.25, -290.25, 0), (0, 0, 90))):
            Circle(SKETCH14_R, mode=Mode.SUBTRACT)
        with Locations(Location((46.25, -257.75, 0), (0, 0, 90))):
            Circle(SKETCH14_R, mode=Mode.SUBTRACT)
        with Locations(Location((-46.25, -257.75, 0), (0, 0, 270))):
            Circle(SKETCH14_R, mode=Mode.SUBTRACT)
    extrude(amount=-BOSS_EXTRUDE9_DEPTH)

    # Sketch15 → Cut-Extrude5 (cut)
    with BuildSketch(Plane.XZ.offset(19.65)):
        with Locations((0, 269)):
            Rectangle(SKETCH15_W, SKETCH15_H)
    extrude(amount=-CUT_EXTRUDE5_DEPTH, mode=Mode.SUBTRACT)


solid = part.part
